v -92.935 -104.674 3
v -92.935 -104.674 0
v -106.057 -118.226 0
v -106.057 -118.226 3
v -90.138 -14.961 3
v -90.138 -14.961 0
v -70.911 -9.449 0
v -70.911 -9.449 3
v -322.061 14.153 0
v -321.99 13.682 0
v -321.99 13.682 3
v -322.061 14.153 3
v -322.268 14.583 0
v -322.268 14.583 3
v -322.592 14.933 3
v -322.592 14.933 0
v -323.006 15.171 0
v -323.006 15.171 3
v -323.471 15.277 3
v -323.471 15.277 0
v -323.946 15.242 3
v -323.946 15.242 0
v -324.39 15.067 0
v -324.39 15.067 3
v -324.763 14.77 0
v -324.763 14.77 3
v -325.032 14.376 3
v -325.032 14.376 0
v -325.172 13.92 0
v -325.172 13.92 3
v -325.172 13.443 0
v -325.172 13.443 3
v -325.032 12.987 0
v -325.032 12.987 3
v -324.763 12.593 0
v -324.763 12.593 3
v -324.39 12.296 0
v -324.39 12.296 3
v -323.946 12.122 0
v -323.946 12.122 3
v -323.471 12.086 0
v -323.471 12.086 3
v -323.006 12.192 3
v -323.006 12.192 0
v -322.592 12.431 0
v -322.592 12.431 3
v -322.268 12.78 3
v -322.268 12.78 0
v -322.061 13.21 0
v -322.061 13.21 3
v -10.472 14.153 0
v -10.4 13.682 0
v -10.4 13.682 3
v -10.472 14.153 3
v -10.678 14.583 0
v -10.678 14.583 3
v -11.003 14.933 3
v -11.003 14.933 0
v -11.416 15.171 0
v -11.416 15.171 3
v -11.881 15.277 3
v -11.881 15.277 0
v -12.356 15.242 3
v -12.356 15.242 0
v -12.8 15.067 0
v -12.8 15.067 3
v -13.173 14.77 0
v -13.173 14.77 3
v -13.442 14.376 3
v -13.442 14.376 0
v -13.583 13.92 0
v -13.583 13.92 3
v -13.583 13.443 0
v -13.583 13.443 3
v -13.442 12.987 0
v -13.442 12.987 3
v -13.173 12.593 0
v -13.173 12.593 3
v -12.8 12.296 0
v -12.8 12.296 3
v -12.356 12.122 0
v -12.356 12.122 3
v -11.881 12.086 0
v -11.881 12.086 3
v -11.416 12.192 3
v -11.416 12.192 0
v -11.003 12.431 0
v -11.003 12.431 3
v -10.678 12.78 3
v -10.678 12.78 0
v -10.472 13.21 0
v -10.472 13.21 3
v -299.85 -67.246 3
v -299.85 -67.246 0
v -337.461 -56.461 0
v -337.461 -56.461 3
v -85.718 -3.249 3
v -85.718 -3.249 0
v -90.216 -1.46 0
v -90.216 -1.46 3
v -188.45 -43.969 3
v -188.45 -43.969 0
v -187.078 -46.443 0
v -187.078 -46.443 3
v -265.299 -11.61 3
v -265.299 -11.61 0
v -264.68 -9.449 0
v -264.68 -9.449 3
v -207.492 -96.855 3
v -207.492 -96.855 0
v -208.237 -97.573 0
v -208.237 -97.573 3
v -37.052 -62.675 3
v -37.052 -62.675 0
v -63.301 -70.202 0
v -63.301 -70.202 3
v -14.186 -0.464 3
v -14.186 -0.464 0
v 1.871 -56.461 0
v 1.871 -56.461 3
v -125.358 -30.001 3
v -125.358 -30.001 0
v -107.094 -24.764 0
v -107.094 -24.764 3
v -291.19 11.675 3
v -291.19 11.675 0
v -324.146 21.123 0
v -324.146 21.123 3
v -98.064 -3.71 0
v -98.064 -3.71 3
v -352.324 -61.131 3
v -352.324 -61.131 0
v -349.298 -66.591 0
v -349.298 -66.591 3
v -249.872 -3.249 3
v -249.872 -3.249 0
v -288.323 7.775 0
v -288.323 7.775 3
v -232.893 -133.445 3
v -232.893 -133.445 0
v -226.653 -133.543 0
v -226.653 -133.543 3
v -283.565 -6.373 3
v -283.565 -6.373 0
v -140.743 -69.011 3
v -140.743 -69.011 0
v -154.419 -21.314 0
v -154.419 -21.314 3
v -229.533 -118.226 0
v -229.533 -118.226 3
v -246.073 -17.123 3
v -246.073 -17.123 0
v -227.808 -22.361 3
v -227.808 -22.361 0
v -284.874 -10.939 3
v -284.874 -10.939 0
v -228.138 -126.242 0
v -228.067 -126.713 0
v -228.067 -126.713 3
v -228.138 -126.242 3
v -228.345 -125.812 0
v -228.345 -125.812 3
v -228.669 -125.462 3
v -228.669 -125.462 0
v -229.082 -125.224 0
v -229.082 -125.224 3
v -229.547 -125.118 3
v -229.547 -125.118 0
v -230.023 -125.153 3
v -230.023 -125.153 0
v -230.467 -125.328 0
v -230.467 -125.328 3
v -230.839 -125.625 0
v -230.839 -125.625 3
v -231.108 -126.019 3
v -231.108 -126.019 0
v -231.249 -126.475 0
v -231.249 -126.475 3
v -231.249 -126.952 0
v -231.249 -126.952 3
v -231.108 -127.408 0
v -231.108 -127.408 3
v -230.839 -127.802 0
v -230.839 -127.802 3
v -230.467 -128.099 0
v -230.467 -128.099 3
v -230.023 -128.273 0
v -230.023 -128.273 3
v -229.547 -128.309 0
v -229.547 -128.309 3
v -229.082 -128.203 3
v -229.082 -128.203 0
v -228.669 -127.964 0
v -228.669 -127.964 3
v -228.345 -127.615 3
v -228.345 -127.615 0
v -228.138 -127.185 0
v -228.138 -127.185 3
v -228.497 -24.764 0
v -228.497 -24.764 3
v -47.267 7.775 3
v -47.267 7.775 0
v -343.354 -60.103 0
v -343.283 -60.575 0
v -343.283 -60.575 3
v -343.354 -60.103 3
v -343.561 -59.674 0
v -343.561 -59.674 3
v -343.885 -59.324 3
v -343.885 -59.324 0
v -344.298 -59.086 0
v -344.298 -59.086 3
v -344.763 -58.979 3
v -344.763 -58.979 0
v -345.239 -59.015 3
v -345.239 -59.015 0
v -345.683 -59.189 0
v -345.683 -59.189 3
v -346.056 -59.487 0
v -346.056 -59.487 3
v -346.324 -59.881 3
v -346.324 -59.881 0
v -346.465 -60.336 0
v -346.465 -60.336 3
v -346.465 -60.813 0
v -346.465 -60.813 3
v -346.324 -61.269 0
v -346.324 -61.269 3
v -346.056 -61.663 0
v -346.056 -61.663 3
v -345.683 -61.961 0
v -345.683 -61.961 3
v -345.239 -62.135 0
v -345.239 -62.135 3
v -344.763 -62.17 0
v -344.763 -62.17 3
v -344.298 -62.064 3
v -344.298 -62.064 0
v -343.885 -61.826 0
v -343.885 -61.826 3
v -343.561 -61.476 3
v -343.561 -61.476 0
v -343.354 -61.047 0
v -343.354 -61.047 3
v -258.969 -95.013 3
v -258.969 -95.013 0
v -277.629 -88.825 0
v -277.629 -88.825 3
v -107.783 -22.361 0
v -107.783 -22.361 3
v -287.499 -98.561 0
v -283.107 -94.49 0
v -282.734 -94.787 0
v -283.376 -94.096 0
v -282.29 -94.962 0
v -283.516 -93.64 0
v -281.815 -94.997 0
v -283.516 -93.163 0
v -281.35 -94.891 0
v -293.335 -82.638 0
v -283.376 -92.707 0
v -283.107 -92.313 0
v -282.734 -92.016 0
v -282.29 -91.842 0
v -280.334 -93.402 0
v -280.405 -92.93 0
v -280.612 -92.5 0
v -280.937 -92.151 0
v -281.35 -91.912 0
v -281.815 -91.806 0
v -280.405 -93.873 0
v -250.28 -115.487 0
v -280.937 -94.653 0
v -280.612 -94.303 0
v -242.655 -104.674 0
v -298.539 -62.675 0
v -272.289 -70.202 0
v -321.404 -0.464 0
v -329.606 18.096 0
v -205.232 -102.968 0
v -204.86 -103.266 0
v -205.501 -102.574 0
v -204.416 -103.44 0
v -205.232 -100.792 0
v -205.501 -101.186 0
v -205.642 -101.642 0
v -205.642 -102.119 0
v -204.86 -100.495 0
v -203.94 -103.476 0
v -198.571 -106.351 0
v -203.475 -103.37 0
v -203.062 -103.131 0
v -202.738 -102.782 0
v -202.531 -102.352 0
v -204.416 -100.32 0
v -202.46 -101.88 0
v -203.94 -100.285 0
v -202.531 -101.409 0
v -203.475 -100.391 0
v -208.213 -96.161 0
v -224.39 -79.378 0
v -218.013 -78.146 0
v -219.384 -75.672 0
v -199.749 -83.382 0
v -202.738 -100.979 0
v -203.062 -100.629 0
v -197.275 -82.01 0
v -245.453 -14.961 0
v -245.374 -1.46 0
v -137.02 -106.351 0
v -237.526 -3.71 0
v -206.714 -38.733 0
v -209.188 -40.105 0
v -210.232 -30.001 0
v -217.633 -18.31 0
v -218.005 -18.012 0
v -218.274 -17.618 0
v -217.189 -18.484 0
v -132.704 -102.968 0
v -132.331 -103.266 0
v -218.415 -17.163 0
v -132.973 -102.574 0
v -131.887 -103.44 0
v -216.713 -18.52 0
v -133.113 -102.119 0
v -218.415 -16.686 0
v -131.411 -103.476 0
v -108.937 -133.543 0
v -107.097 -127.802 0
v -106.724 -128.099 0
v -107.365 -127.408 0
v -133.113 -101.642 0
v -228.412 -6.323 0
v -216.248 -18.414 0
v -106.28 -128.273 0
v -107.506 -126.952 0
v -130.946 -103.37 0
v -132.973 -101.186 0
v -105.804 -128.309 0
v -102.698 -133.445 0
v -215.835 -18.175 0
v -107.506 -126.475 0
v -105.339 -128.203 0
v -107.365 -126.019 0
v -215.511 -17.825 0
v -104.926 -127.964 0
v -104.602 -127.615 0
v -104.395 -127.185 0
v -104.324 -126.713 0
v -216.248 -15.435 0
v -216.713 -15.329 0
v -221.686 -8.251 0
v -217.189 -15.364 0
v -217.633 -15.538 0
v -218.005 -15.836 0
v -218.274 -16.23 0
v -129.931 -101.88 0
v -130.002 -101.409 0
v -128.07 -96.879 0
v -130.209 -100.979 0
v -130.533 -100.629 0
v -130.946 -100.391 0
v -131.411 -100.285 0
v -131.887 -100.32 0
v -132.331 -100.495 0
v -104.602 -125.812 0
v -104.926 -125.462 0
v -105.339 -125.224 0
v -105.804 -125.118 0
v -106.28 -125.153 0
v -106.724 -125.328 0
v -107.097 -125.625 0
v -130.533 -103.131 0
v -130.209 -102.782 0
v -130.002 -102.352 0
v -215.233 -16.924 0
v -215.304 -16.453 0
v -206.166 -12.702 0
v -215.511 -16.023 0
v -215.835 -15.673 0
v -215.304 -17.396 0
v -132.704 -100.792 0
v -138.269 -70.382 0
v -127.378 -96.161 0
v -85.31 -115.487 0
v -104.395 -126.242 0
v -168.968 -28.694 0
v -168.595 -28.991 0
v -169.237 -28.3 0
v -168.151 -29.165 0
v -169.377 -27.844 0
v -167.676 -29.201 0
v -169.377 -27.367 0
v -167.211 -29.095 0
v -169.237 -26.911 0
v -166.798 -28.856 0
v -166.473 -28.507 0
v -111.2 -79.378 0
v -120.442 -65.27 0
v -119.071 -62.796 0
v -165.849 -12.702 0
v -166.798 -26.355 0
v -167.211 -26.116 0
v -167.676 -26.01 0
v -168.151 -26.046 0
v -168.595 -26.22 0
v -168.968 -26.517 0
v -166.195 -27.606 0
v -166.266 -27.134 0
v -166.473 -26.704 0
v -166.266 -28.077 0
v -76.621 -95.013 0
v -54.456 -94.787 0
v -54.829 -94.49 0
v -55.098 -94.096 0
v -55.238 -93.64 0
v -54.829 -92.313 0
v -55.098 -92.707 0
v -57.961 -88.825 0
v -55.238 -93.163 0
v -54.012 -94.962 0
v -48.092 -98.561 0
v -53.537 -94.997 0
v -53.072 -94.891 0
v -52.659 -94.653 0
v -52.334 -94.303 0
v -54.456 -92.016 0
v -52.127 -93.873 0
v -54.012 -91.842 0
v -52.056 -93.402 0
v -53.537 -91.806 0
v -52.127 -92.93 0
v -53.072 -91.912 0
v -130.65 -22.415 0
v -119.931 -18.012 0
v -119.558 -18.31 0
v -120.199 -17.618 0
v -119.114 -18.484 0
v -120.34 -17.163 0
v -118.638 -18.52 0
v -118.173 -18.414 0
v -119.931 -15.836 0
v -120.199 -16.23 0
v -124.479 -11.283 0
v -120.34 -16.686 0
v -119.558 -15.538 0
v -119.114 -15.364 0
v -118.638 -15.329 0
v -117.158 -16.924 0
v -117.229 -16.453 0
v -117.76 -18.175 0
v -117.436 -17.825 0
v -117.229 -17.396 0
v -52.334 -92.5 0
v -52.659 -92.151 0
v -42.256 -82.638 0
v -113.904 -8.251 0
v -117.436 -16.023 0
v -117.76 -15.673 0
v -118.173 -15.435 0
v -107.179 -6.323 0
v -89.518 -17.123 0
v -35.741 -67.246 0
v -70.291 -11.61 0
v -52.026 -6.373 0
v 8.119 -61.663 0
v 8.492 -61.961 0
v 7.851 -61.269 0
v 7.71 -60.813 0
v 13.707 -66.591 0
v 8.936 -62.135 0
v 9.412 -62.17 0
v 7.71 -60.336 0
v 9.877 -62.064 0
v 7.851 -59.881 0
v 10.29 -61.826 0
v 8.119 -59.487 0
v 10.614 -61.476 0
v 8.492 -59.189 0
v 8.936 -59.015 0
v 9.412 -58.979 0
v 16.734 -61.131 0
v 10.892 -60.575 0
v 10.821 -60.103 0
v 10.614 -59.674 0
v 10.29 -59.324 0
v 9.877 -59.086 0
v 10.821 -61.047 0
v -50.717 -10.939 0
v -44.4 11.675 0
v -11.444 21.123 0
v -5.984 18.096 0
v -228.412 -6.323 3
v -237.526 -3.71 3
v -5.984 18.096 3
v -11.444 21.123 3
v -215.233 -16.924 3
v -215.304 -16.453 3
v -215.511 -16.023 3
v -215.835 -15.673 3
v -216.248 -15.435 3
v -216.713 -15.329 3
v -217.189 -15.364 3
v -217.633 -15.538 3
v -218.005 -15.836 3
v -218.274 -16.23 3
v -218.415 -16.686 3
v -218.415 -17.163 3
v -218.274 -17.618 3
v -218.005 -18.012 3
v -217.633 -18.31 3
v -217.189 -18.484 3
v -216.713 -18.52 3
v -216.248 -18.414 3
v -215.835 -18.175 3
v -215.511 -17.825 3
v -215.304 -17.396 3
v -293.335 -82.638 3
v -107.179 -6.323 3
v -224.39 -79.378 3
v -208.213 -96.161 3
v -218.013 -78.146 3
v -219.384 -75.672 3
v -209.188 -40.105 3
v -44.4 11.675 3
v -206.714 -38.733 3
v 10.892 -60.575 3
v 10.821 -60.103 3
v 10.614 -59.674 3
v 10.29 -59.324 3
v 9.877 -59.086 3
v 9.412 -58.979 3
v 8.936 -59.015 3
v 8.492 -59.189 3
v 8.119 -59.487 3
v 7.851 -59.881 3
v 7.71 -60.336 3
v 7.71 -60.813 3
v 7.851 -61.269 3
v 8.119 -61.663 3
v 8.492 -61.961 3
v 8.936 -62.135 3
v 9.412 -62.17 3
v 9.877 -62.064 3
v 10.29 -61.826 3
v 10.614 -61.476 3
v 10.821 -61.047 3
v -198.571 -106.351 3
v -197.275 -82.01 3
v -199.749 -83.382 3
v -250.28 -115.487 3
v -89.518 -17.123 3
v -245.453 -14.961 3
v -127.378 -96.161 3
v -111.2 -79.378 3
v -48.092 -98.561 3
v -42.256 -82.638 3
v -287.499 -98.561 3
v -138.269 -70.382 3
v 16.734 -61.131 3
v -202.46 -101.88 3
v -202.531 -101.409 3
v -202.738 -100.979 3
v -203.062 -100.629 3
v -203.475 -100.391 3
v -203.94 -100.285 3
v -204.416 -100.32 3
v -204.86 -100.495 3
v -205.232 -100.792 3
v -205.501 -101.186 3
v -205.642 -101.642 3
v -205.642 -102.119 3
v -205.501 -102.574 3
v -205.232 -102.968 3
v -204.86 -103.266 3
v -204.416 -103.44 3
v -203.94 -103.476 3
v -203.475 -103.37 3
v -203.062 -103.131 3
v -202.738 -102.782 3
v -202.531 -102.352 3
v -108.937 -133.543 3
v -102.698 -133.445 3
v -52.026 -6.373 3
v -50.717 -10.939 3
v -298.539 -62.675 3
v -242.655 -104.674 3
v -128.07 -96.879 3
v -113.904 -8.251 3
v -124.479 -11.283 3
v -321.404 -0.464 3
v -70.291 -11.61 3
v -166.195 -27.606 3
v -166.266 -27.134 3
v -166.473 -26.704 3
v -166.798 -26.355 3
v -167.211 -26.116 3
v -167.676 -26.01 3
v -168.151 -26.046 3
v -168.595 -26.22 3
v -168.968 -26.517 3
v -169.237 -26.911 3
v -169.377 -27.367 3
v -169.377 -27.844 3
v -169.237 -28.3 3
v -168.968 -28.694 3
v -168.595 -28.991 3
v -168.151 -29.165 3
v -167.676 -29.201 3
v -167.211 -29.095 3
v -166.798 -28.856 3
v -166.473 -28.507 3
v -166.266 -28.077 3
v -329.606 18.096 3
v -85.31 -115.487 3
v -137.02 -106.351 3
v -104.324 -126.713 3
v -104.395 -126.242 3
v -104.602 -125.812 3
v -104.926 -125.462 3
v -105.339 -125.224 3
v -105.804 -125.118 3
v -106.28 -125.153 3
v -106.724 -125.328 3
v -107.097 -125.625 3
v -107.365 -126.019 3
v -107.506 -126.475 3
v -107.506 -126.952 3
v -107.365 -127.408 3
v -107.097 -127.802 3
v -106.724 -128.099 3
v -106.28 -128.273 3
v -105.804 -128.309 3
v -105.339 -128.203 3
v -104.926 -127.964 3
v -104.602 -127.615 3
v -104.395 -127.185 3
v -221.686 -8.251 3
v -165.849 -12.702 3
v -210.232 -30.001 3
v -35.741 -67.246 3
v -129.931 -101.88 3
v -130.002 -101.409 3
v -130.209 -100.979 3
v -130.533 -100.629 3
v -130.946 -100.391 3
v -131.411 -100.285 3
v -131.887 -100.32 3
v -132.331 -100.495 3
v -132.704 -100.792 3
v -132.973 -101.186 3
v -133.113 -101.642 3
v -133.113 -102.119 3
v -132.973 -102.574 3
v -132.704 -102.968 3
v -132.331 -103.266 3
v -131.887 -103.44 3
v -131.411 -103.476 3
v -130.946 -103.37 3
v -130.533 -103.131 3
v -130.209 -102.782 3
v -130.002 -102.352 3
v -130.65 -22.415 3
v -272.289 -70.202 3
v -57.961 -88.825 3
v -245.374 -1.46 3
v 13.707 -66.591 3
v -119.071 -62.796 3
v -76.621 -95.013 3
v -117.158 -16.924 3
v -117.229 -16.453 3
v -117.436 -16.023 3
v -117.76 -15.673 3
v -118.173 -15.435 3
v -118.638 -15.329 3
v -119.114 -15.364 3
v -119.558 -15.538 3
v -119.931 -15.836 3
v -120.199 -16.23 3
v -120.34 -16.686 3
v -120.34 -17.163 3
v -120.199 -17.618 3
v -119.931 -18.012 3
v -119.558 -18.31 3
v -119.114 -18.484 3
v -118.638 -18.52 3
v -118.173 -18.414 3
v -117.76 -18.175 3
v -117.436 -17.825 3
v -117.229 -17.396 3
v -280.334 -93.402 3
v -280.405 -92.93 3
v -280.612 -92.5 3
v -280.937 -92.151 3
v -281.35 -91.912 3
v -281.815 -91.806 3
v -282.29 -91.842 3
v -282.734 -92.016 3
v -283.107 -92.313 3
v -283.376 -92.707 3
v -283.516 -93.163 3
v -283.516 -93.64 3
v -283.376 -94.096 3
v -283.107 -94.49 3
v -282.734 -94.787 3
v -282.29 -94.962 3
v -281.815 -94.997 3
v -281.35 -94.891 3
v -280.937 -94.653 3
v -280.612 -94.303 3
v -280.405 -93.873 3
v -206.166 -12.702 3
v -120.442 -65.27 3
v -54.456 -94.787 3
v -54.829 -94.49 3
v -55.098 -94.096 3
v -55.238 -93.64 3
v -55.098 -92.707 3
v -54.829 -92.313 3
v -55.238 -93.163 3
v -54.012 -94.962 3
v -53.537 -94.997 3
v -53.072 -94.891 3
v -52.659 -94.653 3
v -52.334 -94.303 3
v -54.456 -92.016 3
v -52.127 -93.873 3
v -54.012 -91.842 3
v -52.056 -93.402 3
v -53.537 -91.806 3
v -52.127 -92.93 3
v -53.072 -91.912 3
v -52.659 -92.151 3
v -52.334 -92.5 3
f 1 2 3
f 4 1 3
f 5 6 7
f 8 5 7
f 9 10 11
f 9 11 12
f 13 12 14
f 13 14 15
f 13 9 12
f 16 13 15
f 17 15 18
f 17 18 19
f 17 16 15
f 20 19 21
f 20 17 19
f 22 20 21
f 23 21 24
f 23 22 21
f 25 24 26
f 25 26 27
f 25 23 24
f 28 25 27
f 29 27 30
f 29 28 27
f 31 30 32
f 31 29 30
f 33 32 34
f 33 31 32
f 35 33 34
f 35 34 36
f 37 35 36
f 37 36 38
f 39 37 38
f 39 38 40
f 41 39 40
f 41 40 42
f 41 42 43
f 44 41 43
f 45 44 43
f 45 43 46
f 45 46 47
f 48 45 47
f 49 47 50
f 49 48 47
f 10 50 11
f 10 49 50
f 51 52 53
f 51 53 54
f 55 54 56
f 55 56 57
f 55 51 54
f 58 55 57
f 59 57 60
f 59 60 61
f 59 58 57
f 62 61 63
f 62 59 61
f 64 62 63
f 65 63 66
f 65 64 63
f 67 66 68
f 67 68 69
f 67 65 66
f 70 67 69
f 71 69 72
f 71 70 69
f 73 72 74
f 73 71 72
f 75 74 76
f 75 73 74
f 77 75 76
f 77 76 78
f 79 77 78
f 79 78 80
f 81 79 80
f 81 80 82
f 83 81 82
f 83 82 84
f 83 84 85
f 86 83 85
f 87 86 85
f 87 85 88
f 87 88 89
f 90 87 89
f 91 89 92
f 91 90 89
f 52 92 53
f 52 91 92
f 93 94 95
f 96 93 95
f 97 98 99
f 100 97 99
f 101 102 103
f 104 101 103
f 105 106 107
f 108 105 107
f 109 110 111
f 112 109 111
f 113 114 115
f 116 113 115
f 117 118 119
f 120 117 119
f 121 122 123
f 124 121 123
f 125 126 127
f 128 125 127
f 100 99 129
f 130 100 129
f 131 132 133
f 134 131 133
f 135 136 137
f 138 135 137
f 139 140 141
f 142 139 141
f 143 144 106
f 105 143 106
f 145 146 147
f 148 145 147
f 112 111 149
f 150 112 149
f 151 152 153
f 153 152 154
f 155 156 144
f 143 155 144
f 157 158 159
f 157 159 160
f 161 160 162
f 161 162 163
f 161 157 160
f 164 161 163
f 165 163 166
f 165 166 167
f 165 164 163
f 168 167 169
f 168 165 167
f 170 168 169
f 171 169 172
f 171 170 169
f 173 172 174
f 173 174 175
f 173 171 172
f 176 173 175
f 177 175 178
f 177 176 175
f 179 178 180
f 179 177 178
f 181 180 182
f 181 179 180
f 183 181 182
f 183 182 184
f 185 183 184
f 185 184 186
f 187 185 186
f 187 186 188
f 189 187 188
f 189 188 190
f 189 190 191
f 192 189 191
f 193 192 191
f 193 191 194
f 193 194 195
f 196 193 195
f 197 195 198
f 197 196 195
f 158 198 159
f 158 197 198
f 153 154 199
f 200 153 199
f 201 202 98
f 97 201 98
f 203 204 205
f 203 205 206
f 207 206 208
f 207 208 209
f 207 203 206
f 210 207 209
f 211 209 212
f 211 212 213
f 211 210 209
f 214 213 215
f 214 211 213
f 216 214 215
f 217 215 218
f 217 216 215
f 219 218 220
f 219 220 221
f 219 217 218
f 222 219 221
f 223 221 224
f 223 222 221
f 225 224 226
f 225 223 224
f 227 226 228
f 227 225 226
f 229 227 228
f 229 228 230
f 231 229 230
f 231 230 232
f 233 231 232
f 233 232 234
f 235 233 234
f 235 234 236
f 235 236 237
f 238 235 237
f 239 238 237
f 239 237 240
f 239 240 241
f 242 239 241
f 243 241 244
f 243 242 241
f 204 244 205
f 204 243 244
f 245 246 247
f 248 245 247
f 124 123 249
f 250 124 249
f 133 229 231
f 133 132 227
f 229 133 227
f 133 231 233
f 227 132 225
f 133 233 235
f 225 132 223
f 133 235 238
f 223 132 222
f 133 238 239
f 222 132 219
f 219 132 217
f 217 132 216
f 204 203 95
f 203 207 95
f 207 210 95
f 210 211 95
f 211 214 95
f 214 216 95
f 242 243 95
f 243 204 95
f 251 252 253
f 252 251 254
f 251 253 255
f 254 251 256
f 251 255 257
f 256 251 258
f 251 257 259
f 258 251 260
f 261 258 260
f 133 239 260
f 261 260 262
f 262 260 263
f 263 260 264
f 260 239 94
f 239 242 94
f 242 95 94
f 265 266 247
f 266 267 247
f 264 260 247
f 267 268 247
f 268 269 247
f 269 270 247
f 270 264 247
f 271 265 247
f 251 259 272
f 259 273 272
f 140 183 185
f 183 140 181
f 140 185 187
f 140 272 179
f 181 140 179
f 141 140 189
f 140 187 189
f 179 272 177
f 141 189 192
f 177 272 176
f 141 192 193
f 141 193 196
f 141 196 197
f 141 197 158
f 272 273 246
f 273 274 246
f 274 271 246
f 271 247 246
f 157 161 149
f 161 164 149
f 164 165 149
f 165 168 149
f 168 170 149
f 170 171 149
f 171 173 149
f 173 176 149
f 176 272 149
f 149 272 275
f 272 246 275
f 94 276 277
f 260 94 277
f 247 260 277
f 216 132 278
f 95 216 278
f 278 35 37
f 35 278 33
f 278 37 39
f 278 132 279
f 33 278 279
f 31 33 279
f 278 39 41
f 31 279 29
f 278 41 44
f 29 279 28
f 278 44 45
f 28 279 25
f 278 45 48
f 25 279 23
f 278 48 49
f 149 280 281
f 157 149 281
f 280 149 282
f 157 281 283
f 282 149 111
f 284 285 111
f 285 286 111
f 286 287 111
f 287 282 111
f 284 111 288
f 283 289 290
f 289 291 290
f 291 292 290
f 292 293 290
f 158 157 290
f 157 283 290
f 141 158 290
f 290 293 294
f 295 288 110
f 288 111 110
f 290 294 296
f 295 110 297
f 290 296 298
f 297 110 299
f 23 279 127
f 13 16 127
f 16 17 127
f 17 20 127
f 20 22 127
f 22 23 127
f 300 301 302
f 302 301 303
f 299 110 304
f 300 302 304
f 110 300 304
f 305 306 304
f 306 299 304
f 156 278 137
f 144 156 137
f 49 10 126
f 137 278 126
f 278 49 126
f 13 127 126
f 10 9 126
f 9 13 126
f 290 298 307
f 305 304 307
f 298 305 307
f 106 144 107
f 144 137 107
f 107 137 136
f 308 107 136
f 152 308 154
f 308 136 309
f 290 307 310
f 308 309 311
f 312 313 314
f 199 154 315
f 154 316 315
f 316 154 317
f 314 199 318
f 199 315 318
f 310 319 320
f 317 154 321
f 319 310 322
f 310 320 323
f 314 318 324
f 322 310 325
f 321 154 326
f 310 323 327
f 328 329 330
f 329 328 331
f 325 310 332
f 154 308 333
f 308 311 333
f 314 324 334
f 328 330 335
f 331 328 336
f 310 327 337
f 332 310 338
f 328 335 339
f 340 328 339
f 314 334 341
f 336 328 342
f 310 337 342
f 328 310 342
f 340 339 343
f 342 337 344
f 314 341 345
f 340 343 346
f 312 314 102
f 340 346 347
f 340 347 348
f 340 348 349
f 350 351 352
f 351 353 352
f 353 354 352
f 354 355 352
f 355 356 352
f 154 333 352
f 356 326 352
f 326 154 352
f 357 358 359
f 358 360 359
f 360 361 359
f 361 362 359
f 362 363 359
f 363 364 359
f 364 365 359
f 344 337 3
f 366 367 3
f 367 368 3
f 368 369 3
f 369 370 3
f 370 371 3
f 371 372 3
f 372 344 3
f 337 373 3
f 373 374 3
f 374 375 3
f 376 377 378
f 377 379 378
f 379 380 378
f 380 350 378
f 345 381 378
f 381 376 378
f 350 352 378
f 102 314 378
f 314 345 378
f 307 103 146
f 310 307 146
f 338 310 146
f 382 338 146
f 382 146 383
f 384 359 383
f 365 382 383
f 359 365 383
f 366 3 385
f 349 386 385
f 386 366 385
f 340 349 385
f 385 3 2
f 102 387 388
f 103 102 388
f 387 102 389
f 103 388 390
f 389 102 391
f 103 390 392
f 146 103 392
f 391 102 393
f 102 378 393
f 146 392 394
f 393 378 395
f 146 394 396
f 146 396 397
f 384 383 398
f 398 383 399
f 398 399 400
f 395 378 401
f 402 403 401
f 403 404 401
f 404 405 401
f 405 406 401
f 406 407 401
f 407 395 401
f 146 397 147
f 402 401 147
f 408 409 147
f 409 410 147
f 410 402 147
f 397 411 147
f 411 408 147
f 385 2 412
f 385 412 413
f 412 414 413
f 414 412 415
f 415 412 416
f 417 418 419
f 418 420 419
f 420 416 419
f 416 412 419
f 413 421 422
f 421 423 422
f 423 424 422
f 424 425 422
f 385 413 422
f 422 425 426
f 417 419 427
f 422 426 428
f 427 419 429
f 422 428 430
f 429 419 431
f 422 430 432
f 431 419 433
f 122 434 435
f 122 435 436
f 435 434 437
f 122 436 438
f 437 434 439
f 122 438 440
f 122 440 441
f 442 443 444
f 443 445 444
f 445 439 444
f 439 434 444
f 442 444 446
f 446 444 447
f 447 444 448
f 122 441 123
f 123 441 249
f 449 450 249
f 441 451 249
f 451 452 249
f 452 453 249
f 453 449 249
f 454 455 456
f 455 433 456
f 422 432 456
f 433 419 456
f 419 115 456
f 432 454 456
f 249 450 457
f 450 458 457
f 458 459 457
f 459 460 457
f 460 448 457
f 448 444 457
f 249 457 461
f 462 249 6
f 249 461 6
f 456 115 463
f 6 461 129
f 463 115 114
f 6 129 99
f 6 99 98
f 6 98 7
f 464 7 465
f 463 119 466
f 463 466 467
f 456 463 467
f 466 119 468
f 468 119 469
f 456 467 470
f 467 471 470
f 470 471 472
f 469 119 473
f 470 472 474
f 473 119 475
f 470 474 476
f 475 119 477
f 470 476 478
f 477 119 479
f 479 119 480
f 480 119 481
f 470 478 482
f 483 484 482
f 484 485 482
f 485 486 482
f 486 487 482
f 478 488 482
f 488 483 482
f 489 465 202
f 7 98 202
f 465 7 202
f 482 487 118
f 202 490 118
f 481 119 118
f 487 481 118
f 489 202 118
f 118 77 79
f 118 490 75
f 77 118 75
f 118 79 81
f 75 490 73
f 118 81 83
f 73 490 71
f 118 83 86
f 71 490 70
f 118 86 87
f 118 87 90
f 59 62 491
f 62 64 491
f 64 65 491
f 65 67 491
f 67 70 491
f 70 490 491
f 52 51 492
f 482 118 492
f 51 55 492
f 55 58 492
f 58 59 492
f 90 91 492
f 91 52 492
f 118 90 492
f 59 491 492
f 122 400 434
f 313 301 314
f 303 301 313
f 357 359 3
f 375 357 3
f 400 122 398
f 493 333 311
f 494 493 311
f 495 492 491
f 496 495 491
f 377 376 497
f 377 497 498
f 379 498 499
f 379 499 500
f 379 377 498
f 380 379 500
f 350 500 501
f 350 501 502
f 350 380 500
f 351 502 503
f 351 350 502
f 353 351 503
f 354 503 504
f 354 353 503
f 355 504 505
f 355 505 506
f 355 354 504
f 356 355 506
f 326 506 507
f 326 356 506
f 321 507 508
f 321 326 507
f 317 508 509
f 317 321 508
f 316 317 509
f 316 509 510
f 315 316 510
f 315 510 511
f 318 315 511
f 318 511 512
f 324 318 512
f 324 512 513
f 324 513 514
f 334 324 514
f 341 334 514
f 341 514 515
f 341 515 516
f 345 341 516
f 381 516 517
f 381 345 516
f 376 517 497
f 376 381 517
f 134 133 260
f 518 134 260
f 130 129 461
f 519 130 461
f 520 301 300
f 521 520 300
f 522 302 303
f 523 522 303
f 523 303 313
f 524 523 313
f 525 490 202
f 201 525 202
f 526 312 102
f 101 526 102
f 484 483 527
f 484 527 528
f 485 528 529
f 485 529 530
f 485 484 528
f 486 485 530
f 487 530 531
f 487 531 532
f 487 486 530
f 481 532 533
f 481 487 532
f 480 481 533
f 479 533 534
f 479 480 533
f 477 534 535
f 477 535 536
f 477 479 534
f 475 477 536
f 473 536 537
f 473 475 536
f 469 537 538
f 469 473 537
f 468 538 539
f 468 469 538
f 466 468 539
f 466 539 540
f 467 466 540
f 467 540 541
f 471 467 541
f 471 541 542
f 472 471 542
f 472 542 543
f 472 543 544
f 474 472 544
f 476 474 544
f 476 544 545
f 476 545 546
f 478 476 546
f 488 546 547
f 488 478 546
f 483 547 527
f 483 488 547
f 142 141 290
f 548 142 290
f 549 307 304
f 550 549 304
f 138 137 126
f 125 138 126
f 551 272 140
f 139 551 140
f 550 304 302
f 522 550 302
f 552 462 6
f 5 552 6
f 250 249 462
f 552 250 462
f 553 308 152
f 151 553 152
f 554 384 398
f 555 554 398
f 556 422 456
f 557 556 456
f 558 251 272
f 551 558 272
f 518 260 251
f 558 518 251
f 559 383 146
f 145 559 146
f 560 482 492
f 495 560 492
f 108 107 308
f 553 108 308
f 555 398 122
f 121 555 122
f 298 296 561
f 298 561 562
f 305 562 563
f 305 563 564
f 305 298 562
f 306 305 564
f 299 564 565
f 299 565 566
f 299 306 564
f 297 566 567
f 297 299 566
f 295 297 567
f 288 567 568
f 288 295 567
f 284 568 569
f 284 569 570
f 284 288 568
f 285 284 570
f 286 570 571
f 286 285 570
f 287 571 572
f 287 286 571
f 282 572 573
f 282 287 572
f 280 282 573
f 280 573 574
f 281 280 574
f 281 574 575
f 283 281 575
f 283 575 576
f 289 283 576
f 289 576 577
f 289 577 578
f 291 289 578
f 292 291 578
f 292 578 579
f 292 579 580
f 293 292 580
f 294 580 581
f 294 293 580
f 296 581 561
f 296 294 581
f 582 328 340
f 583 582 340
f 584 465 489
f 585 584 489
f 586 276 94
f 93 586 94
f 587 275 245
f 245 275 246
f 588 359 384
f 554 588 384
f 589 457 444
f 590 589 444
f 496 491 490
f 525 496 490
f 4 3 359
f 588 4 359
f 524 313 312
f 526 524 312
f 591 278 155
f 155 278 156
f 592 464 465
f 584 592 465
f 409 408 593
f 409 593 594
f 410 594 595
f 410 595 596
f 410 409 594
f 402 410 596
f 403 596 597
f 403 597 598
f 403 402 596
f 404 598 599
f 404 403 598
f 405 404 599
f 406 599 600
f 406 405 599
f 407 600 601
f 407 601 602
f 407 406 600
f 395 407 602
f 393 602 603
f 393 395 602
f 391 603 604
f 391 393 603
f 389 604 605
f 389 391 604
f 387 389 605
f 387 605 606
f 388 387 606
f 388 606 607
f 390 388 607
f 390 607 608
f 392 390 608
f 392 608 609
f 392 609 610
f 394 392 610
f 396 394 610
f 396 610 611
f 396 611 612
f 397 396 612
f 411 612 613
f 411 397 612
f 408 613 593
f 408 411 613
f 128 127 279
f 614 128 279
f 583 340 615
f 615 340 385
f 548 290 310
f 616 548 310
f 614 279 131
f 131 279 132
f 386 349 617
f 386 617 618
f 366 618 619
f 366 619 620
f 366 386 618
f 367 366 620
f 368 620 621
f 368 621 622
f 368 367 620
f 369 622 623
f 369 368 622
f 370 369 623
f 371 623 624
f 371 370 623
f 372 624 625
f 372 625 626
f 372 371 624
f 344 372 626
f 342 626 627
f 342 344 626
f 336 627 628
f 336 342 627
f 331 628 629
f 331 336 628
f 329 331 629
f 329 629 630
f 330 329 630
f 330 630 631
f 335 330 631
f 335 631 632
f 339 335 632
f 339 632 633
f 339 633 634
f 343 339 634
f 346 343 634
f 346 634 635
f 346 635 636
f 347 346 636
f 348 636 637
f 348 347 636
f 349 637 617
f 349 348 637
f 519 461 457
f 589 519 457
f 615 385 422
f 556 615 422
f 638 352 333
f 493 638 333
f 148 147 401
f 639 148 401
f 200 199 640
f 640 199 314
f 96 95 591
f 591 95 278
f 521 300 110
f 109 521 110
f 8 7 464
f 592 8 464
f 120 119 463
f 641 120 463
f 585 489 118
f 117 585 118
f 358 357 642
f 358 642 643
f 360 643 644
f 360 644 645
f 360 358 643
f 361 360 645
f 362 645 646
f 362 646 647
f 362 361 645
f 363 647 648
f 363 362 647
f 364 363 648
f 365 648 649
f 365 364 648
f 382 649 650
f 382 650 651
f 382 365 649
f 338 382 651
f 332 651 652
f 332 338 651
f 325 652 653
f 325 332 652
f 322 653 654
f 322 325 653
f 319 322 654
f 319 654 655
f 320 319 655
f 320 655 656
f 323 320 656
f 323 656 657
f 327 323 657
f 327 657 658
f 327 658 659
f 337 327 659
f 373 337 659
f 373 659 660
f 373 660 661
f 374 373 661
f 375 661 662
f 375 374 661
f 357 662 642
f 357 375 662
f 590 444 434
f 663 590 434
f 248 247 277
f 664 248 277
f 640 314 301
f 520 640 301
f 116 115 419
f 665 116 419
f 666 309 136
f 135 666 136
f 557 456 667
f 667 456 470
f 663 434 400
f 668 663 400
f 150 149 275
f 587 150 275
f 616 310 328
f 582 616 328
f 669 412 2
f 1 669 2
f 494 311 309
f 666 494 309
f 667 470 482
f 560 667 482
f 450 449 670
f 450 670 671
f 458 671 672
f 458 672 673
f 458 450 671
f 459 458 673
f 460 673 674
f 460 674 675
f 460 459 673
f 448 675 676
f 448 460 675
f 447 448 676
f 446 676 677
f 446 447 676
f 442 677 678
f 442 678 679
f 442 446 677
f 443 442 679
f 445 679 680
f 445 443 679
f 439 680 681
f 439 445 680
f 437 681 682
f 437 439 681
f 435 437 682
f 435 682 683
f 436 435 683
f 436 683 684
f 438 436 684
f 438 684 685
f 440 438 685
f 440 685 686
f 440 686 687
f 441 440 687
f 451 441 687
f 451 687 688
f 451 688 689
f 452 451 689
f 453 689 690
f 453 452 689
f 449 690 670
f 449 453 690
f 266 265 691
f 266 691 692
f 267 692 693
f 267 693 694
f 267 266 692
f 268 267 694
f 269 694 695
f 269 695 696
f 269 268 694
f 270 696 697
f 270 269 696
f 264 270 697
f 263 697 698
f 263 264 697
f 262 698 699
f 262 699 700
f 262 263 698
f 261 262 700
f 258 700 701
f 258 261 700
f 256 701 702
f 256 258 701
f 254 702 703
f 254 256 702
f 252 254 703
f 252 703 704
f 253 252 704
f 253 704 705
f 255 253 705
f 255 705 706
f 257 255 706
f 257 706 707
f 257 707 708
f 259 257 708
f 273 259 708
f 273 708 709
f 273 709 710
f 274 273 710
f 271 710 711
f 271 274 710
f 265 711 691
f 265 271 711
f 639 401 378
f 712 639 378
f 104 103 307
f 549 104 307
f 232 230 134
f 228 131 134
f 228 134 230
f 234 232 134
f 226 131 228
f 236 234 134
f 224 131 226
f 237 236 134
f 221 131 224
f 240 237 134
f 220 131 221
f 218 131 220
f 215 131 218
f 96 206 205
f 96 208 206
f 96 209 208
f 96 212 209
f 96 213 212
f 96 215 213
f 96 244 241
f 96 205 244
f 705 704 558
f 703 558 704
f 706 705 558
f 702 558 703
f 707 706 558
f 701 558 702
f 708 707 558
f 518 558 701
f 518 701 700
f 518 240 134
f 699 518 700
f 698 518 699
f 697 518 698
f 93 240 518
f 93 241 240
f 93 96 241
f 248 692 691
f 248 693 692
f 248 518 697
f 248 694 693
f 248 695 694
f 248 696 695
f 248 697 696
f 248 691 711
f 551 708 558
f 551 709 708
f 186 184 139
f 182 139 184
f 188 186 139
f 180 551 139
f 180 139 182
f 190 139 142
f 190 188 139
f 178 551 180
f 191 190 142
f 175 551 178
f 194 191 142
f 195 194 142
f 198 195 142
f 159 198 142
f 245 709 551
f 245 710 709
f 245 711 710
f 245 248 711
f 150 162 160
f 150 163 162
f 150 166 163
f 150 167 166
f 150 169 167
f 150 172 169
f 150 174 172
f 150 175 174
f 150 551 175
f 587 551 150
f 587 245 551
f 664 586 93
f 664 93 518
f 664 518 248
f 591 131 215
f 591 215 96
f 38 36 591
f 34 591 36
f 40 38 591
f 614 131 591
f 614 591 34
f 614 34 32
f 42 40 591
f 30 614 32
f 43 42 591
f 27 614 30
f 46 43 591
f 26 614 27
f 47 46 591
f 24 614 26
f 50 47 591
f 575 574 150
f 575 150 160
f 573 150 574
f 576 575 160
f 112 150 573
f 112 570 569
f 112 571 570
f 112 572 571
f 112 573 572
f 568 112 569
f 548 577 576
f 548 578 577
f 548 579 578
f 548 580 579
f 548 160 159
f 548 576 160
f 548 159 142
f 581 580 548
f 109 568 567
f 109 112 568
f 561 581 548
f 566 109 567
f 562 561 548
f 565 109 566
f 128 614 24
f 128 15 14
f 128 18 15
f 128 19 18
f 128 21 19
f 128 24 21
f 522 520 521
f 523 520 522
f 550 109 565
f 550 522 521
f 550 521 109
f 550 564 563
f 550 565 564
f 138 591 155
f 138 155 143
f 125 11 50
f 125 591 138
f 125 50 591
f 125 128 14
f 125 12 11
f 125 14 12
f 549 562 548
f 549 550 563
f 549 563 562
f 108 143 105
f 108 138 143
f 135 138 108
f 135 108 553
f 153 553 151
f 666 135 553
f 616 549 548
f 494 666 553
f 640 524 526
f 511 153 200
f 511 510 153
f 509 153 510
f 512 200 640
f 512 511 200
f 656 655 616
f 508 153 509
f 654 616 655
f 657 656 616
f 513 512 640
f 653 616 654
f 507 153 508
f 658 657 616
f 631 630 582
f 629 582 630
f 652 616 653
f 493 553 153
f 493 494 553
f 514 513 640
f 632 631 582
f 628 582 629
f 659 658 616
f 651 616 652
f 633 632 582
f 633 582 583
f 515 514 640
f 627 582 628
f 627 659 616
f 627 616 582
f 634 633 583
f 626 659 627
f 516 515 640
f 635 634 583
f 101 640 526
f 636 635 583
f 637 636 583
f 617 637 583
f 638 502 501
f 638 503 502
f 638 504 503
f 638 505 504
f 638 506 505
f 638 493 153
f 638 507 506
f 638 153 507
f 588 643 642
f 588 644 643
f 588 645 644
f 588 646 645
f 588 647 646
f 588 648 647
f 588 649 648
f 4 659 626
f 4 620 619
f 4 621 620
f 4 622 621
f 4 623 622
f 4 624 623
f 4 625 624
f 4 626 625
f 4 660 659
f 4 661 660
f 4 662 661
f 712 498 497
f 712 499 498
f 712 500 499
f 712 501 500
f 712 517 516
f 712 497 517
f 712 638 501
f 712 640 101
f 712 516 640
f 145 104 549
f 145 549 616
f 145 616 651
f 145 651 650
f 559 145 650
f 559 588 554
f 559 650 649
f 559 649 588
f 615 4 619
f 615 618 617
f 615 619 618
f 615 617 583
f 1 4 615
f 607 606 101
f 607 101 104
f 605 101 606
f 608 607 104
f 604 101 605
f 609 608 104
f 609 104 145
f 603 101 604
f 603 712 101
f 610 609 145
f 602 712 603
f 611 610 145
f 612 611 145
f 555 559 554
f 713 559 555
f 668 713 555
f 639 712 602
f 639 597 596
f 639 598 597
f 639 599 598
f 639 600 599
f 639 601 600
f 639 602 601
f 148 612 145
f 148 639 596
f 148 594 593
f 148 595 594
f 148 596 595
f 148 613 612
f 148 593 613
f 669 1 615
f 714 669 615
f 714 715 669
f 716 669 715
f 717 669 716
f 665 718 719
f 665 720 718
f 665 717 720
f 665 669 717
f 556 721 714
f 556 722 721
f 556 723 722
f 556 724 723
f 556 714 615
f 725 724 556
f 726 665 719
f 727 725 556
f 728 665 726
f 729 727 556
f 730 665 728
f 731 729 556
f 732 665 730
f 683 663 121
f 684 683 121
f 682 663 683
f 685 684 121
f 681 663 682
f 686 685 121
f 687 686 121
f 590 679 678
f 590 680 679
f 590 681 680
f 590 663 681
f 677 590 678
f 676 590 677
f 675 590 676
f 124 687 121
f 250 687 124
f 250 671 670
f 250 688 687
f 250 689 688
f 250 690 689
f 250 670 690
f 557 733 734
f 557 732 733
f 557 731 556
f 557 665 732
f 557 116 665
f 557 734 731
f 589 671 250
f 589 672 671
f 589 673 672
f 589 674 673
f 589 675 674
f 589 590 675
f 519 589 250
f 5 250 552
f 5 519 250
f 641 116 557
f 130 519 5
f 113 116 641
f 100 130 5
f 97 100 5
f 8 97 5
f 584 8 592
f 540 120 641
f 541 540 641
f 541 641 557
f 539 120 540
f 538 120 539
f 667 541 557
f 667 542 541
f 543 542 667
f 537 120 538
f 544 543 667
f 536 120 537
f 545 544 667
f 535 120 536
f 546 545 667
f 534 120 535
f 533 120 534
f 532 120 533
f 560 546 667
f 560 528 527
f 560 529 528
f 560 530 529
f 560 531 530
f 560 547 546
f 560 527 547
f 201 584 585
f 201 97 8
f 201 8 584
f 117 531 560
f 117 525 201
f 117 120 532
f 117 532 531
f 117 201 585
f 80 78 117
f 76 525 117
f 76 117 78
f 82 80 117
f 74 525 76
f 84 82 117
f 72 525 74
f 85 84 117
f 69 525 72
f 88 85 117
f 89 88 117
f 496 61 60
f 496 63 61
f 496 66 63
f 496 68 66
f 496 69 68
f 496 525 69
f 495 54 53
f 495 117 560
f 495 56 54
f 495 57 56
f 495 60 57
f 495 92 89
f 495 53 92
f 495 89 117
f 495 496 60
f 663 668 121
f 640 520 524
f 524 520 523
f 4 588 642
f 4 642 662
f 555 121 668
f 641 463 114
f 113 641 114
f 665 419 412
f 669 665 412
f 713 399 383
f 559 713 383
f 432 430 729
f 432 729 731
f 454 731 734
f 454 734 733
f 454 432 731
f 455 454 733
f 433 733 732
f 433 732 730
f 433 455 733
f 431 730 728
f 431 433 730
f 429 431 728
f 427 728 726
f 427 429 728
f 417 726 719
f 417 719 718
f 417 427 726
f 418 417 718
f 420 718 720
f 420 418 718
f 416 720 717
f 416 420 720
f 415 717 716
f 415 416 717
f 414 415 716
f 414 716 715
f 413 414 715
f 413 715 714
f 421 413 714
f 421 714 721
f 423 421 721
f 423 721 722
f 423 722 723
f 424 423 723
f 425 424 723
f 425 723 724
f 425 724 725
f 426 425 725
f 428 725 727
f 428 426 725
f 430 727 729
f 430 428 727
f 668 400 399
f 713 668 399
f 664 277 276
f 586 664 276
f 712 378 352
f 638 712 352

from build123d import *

# Parameters (mm, degrees)
ESQUISSE1_R        = 1.6
BOSS_EXTRU_1_DEPTH = 3


with BuildPart() as part:
    # Esquisse1 → Boss.-Extru.1 (new body)
    with BuildSketch(Plane.XY):
        Polygon((-130.649820486, -22.415487094), (-119.070790786, -62.796362516), (-120.442039466, -65.27016062), (-138.268849115, -70.381916029), (-140.742647218, -69.010667349), (-154.419403971, -21.314148304), (-165.848732708, -12.701531345), (-206.165691337, -12.701531345), (-221.686141291, -8.251113935), (-228.411595336, -6.322621021), (-237.526398495, -3.709541892), (-245.374022141, -1.459744369), (-249.872259625, -3.248768002), (-288.323340616, 7.774587685), (-291.190458161, 11.675149567), (-324.146226634, 21.123080509), (-329.606279511, 18.096325283), (-352.324375235, -61.131089881), (-349.297882974, -66.591026451), (-293.334748244, -82.638197107), (-287.498708924, -98.561018129), (-250.280154874, -115.48724507), (-232.892593163, -133.444615579), (-226.653475651, -133.542771169), (-198.570548361, -106.350948678), (-137.019971382, -106.350948678), (-108.937044092, -133.542771169), (-102.69792658, -133.444615579), (-85.310364869, -115.48724507), (-48.091810819, -98.561018129), (-42.255771499, -82.638197107), (13.707363231, -66.591026451), (16.733855492, -61.131089881), (-5.984240232, 18.096325283), (-11.444293109, 21.123080509), (-44.400061582, 11.675149567), (-47.267179127, 7.774587685), (-85.718260118, -3.248768002), (-90.216497602, -1.459744369), (-98.064121248, -3.709541892), (-107.178924407, -6.322621021), (-113.904378452, -8.251113935), (-124.479201425, -11.283395628), align=None)
        with Locations((-229.666591606, -126.713325795)):
            Circle(ESQUISSE1_R, mode=Mode.SUBTRACT)
        with Locations((-204.059552706, -101.880200807)):
            Circle(ESQUISSE1_R, mode=Mode.SUBTRACT)
        with Locations((-281.934339477, -93.401689518)):
            Circle(ESQUISSE1_R, mode=Mode.SUBTRACT)
        with Locations((-344.882804027, -60.574933915)):
            Circle(ESQUISSE1_R, mode=Mode.SUBTRACT)
        Polygon((-210.232188047, -30.001147656), (-224.390430785, -79.377961929), (-208.212806214, -96.161100182), (-207.491865187, -96.85509979), (-208.236606037, -97.572971364), (-229.533063287, -118.225792128), (-242.655085998, -104.673746846), (-258.969310369, -95.012679745), (-277.629290011, -88.825419148), (-272.289144354, -70.202118055), (-298.538981418, -62.6750984), (-299.849714513, -67.246167925), (-337.461409717, -56.461187875), (-321.404434006, -0.463858857), (-284.873898651, -10.938821309), (-283.564528345, -6.372504389), (-265.299260667, -11.609985616), (-264.679553884, -9.448811229), (-245.452786066, -14.960840928), (-246.072799476, -17.123084647), (-227.807531798, -22.360565873), (-228.496674065, -24.763890567), align=None, mode=Mode.SUBTRACT)
        Polygon((-187.078341197, -46.443029785), (-197.274945207, -82.010279702), (-199.748667041, -83.381665967), (-218.012930512, -78.145572016), (-219.384316777, -75.671850182), (-209.187712767, -40.104600265), (-206.713990933, -38.733214), (-188.449727462, -43.969307951), align=None, mode=Mode.SUBTRACT)
        with Locations((-105.923928137, -126.713325795)):
            Circle(ESQUISSE1_R, mode=Mode.SUBTRACT)
        with Locations((-131.530967037, -101.880200807)):
            Circle(ESQUISSE1_R, mode=Mode.SUBTRACT)
        with Locations((-53.656180266, -93.401689518)):
            Circle(ESQUISSE1_R, mode=Mode.SUBTRACT)
        Polygon((-106.057456456, -118.225792128), (-128.0696158, -96.878899722), (-127.377713529, -96.161100182), (-111.200088958, -79.377961929), (-125.358331696, -30.001147656), (-107.093845678, -24.763890567), (-107.782987945, -22.360565873), (-89.517720268, -17.123084647), (-90.137733677, -14.960840928), (-70.910965859, -9.448811229), (-70.291259076, -11.609985616), (-52.025991399, -6.372504389), (-50.716621092, -10.938821309), (-14.186085737, -0.463858857), (1.870889973, -56.461187875), (-35.740805231, -67.246167925), (-37.051538325, -62.6750984), (-63.301375389, -70.202118055), (-57.961229733, -88.825419148), (-76.621209374, -95.012679745), (-92.935433745, -104.673746846), align=None, mode=Mode.SUBTRACT)
        with Locations((9.292284284, -60.574933915)):
            Circle(ESQUISSE1_R, mode=Mode.SUBTRACT)
        with Locations((-167.795259872, -27.605548894)):
            Circle(ESQUISSE1_R, mode=Mode.SUBTRACT)
        with Locations((-323.590068827, 13.68165837)):
            Circle(ESQUISSE1_R, mode=Mode.SUBTRACT)
        with Locations((-216.832585966, -16.924131519)):
            Circle(ESQUISSE1_R, mode=Mode.SUBTRACT)
        with Locations((-118.757933777, -16.924131519)):
            Circle(ESQUISSE1_R, mode=Mode.SUBTRACT)
        with Locations((-12.000450916, 13.68165837)):
            Circle(ESQUISSE1_R, mode=Mode.SUBTRACT)
    extrude(amount=BOSS_EXTRU_1_DEPTH)


solid = part.part
